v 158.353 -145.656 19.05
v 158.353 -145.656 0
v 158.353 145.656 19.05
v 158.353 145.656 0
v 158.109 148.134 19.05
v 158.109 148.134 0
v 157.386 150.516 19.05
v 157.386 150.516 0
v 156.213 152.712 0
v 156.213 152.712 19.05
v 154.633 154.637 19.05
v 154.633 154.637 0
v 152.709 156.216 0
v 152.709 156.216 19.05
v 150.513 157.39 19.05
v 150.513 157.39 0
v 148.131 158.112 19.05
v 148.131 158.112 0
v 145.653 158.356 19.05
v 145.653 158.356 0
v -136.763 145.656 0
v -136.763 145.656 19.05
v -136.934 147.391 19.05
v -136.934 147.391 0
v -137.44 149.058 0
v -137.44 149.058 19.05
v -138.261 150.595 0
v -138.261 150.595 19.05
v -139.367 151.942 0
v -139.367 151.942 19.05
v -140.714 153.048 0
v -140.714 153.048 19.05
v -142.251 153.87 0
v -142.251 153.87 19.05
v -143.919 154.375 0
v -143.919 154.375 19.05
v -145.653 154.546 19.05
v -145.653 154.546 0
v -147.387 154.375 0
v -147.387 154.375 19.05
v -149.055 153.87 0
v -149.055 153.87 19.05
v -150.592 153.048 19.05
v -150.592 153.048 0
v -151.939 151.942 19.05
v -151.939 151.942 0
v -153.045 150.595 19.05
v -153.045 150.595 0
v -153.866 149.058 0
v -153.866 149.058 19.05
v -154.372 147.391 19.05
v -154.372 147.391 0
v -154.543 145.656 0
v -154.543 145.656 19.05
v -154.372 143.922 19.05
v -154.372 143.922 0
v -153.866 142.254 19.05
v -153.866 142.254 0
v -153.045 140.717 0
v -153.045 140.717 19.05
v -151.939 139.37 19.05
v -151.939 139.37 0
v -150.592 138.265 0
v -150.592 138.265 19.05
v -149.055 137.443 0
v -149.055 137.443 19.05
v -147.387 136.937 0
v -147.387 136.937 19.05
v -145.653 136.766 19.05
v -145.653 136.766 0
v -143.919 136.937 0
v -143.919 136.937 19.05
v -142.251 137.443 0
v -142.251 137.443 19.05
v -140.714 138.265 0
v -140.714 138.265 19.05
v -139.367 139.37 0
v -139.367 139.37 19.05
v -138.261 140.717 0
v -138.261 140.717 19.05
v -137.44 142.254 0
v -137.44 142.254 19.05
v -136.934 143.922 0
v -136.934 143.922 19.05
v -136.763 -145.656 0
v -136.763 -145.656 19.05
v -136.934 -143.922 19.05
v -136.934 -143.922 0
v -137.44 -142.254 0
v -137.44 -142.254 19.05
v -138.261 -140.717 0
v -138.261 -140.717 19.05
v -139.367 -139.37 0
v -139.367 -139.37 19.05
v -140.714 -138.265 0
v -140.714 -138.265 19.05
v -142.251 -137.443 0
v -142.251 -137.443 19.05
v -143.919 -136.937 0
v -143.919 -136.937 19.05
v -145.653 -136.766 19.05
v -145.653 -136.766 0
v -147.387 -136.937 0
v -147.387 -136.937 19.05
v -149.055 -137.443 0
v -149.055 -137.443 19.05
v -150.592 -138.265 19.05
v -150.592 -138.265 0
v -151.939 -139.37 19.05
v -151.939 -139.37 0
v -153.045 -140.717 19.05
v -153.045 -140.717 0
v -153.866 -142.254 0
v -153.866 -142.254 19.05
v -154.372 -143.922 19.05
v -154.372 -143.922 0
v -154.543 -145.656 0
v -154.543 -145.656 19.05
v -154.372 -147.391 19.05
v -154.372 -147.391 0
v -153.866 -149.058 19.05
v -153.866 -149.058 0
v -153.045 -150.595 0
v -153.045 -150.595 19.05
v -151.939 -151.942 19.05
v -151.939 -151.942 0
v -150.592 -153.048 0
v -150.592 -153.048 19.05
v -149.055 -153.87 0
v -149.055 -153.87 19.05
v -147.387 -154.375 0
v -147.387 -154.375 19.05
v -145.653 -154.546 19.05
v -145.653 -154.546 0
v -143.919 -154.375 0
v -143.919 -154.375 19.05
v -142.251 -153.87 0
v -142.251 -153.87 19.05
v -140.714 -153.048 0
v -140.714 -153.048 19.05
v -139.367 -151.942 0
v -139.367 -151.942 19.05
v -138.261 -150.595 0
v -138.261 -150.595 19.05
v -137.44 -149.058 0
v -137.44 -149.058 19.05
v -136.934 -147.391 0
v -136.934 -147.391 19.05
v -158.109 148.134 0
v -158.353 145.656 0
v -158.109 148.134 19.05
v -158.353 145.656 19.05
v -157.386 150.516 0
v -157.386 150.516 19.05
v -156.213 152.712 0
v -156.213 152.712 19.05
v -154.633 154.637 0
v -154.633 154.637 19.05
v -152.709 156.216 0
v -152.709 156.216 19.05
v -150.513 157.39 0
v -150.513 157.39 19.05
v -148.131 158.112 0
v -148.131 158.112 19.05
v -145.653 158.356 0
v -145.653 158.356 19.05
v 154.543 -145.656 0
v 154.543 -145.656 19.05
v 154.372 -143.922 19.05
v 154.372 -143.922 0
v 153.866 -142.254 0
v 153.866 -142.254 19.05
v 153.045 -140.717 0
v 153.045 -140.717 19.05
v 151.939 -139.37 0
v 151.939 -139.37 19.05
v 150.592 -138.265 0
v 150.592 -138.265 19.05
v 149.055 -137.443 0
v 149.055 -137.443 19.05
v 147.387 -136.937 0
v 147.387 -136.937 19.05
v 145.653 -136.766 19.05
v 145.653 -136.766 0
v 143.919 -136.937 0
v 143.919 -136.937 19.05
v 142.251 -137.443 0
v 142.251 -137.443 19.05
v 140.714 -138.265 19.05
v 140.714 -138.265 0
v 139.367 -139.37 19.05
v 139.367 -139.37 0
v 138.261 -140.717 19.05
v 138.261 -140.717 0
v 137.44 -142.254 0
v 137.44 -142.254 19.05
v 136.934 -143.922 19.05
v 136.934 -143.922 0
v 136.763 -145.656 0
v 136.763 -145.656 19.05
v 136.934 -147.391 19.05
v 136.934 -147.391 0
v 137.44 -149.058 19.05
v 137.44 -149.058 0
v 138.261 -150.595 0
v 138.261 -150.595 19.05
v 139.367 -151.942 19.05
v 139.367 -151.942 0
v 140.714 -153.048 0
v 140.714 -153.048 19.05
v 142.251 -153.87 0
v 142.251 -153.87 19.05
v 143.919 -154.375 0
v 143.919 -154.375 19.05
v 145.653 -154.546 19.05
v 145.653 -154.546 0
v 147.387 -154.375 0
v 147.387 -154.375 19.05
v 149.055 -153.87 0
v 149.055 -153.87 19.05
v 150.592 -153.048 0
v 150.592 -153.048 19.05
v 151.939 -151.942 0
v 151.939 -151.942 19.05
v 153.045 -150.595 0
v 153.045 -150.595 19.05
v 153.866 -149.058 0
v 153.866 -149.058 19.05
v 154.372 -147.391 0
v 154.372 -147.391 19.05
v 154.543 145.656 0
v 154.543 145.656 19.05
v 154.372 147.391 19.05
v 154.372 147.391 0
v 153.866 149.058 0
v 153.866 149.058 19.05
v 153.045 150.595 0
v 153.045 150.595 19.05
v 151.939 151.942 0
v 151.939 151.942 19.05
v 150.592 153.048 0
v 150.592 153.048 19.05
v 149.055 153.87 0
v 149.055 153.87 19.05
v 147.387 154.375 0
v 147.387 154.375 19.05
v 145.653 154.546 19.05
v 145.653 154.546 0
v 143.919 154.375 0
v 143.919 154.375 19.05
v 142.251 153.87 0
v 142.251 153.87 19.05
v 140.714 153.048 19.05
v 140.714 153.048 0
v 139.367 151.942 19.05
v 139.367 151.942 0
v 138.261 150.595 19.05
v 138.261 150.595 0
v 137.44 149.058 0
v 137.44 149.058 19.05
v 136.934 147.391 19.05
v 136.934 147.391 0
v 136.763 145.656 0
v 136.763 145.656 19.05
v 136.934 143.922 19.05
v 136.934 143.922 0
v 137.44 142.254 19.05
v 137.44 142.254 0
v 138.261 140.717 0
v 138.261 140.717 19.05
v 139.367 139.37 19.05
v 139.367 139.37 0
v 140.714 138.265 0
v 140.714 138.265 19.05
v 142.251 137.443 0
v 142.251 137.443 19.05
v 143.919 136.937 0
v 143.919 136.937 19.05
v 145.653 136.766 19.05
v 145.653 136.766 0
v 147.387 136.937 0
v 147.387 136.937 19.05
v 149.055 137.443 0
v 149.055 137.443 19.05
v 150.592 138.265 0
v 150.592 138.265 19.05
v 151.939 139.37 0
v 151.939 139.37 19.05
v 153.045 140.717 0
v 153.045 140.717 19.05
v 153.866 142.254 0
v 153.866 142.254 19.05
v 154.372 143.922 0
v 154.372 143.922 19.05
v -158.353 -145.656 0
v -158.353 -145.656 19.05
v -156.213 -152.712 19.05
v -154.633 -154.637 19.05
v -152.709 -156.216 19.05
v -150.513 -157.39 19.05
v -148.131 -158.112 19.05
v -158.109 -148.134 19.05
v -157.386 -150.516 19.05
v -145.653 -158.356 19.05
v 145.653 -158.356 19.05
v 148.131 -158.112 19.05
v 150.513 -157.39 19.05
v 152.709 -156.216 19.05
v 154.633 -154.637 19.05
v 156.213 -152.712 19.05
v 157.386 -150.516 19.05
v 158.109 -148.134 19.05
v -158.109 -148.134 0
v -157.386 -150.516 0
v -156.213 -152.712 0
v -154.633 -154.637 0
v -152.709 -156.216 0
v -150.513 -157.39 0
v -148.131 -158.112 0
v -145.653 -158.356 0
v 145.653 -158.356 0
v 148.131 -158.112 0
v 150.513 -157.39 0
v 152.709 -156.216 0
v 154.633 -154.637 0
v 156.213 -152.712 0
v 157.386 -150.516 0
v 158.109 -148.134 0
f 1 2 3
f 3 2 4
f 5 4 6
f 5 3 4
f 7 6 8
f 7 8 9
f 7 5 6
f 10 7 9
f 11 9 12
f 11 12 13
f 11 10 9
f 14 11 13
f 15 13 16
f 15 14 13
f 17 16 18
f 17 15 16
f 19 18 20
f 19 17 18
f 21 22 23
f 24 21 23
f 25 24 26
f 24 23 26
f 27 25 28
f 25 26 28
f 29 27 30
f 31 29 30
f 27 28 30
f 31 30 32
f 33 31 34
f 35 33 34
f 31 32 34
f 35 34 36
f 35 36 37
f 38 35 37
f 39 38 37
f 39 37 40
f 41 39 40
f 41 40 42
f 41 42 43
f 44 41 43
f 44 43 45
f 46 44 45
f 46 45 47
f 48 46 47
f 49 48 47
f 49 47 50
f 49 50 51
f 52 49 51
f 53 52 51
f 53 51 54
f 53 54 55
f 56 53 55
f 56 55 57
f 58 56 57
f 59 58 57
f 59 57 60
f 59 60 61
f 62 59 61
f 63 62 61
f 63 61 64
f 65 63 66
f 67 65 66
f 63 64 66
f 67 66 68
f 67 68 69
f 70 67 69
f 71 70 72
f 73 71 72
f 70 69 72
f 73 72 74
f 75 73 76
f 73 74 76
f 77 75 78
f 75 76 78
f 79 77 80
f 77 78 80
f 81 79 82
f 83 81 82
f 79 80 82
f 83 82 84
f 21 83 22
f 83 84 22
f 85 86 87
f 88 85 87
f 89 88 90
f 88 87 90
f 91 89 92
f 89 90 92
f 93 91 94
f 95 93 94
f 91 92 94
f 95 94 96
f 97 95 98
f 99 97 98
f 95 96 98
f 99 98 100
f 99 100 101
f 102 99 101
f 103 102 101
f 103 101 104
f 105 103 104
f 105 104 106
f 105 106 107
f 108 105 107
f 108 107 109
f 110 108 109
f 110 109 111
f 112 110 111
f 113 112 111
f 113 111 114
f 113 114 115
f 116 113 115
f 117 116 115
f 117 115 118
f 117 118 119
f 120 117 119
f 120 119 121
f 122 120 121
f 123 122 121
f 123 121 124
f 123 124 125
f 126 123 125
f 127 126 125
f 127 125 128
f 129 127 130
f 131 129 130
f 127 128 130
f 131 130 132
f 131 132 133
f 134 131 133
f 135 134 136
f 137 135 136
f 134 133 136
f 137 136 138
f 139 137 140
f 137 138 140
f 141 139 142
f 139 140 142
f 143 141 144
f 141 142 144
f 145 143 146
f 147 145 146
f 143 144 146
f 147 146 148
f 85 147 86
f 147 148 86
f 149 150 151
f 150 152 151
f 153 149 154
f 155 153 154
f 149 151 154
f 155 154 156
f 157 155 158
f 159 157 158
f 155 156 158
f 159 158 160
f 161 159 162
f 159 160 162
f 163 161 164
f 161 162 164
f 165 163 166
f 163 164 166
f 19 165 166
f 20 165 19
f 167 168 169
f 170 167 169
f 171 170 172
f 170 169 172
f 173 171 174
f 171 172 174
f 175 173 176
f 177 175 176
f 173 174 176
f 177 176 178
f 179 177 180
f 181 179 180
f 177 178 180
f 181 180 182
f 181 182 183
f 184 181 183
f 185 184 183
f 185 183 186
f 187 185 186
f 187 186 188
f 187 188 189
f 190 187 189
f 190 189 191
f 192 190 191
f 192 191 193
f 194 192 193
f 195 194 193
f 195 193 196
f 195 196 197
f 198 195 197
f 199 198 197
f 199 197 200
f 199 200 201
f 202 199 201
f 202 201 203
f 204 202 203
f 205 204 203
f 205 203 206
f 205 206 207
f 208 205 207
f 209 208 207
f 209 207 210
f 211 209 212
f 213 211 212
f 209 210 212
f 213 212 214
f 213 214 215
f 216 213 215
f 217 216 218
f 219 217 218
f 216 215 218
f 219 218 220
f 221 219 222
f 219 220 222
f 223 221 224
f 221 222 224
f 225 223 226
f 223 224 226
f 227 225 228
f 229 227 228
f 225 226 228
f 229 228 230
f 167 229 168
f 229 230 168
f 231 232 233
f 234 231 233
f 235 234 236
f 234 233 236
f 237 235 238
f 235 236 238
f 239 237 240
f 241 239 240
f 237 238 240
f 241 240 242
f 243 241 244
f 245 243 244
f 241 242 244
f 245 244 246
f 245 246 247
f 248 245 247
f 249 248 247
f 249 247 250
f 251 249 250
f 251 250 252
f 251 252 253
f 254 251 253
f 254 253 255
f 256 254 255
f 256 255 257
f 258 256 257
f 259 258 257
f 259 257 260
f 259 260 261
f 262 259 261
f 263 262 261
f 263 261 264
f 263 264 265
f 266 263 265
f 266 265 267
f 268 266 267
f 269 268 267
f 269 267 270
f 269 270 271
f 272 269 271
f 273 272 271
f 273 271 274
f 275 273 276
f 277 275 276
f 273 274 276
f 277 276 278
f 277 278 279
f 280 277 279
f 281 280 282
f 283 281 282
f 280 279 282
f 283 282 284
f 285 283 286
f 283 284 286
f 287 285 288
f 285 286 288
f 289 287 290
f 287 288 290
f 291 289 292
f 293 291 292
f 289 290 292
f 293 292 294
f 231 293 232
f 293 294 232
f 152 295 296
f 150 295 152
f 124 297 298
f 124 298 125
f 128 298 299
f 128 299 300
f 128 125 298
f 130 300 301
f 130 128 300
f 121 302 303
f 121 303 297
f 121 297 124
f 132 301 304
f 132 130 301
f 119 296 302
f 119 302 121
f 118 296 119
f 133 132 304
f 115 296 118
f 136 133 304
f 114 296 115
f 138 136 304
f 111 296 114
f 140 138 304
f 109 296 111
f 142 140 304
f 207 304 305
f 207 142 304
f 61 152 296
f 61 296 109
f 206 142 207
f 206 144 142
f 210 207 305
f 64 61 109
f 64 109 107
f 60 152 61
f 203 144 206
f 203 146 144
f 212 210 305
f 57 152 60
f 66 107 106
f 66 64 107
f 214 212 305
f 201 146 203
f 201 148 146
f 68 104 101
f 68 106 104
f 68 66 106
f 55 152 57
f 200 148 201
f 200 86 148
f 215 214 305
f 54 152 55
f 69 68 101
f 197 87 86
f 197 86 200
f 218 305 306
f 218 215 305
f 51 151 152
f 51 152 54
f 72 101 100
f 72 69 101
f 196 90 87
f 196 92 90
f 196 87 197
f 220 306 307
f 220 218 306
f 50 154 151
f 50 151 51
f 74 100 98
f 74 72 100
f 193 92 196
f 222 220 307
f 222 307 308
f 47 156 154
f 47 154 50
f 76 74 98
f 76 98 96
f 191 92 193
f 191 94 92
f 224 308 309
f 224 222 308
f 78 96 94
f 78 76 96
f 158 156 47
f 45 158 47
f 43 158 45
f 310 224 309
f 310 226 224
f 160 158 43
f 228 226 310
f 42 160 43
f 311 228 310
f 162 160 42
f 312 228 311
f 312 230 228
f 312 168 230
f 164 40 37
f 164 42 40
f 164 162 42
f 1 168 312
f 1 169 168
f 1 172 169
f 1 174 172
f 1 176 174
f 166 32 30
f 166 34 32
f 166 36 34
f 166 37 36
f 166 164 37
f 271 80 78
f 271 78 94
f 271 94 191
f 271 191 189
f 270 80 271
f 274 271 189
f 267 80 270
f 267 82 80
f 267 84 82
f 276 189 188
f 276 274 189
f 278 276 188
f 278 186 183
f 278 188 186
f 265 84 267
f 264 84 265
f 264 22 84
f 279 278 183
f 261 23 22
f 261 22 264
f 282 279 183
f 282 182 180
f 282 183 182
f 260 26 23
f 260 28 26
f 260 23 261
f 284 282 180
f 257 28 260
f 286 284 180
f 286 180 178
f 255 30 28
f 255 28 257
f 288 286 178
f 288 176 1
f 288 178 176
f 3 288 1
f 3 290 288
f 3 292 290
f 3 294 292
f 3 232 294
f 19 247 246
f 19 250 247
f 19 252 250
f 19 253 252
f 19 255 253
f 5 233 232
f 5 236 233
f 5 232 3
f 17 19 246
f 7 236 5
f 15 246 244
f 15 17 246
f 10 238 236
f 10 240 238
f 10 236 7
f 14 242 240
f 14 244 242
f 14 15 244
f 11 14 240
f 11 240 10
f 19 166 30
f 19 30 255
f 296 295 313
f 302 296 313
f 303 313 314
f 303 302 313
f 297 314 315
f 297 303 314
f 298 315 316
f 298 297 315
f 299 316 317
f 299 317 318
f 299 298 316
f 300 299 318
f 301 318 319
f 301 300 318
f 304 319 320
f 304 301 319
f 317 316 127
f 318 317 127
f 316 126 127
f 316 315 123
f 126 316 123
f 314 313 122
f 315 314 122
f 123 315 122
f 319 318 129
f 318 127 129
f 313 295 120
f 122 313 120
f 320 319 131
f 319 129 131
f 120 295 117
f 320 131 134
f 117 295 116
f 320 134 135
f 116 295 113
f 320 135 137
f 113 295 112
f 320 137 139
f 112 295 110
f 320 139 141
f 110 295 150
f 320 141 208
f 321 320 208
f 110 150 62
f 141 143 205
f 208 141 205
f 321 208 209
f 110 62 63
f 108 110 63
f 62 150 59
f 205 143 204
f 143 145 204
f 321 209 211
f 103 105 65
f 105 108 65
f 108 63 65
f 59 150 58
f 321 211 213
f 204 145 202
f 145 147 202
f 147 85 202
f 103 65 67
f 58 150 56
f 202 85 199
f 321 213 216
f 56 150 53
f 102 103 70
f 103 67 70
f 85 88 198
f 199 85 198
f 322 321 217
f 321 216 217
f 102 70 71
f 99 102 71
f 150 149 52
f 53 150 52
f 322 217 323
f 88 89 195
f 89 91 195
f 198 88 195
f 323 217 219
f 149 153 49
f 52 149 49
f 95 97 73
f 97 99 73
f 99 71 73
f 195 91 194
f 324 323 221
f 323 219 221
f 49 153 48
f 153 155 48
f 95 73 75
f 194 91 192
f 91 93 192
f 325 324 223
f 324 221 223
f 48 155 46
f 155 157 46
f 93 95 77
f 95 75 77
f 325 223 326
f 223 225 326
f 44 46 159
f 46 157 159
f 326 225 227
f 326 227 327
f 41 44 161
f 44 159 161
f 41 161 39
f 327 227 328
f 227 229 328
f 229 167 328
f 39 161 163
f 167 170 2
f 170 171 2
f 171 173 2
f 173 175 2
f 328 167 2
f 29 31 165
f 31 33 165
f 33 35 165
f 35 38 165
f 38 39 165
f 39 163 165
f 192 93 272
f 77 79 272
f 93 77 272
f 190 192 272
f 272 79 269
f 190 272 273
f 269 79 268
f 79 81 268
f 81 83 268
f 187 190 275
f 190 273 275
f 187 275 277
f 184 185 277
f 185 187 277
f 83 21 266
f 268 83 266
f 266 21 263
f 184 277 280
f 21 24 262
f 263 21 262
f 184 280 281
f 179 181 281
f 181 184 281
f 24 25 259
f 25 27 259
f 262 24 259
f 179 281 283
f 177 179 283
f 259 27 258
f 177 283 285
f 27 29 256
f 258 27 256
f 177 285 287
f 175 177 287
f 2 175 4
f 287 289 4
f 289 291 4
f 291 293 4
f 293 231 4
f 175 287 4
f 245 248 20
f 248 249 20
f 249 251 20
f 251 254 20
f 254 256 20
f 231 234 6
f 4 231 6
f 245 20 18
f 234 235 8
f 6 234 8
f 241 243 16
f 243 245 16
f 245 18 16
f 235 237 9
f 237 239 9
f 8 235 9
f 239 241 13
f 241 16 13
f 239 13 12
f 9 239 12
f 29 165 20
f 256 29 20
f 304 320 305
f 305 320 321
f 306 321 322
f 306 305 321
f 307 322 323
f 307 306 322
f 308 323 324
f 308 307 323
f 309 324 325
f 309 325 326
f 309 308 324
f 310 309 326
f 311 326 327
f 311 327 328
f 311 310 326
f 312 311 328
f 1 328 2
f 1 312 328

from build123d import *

# Parameters (mm, degrees)
F0_W     = 316.70625
F0_H     = 316.7126
F1_DEPTH = 19.05
F2_R     = 12.7
F3_R     = 8.89
F4_DEPTH = 25.4


with BuildPart() as f1:
    # F0 (on Top) → F1 (new body)
    with BuildSketch(Plane.XY):
        Rectangle(F0_W, F0_H)
    extrude(amount=F1_DEPTH)

    # F2
    f2_edges = [f1.edges().sort_by_distance(p)[0] for p in [
        (-158.353125, -158.3563, 9.525),
        (-158.353125, 158.3563, 9.525),
        (158.353125, 158.3563, 9.525),
        (158.353125, -158.3563, 9.525),
    ]]
    fillet(f2_edges, radius=F2_R)

    # F3 (on face) → F4 (cut)
    with BuildSketch(Plane.XY.offset(19.05)):
        with Locations((-145.653125, 145.6563)):
            Circle(F3_R)
        with Locations((145.653125, 145.6563)):
            Circle(F3_R)
        with Locations((145.653125, -145.6563)):
            Circle(F3_R)
        with Locations((-145.653125, -145.6563)):
            Circle(F3_R)
    extrude(amount=-F4_DEPTH, mode=Mode.SUBTRACT)


solid = f1.part
